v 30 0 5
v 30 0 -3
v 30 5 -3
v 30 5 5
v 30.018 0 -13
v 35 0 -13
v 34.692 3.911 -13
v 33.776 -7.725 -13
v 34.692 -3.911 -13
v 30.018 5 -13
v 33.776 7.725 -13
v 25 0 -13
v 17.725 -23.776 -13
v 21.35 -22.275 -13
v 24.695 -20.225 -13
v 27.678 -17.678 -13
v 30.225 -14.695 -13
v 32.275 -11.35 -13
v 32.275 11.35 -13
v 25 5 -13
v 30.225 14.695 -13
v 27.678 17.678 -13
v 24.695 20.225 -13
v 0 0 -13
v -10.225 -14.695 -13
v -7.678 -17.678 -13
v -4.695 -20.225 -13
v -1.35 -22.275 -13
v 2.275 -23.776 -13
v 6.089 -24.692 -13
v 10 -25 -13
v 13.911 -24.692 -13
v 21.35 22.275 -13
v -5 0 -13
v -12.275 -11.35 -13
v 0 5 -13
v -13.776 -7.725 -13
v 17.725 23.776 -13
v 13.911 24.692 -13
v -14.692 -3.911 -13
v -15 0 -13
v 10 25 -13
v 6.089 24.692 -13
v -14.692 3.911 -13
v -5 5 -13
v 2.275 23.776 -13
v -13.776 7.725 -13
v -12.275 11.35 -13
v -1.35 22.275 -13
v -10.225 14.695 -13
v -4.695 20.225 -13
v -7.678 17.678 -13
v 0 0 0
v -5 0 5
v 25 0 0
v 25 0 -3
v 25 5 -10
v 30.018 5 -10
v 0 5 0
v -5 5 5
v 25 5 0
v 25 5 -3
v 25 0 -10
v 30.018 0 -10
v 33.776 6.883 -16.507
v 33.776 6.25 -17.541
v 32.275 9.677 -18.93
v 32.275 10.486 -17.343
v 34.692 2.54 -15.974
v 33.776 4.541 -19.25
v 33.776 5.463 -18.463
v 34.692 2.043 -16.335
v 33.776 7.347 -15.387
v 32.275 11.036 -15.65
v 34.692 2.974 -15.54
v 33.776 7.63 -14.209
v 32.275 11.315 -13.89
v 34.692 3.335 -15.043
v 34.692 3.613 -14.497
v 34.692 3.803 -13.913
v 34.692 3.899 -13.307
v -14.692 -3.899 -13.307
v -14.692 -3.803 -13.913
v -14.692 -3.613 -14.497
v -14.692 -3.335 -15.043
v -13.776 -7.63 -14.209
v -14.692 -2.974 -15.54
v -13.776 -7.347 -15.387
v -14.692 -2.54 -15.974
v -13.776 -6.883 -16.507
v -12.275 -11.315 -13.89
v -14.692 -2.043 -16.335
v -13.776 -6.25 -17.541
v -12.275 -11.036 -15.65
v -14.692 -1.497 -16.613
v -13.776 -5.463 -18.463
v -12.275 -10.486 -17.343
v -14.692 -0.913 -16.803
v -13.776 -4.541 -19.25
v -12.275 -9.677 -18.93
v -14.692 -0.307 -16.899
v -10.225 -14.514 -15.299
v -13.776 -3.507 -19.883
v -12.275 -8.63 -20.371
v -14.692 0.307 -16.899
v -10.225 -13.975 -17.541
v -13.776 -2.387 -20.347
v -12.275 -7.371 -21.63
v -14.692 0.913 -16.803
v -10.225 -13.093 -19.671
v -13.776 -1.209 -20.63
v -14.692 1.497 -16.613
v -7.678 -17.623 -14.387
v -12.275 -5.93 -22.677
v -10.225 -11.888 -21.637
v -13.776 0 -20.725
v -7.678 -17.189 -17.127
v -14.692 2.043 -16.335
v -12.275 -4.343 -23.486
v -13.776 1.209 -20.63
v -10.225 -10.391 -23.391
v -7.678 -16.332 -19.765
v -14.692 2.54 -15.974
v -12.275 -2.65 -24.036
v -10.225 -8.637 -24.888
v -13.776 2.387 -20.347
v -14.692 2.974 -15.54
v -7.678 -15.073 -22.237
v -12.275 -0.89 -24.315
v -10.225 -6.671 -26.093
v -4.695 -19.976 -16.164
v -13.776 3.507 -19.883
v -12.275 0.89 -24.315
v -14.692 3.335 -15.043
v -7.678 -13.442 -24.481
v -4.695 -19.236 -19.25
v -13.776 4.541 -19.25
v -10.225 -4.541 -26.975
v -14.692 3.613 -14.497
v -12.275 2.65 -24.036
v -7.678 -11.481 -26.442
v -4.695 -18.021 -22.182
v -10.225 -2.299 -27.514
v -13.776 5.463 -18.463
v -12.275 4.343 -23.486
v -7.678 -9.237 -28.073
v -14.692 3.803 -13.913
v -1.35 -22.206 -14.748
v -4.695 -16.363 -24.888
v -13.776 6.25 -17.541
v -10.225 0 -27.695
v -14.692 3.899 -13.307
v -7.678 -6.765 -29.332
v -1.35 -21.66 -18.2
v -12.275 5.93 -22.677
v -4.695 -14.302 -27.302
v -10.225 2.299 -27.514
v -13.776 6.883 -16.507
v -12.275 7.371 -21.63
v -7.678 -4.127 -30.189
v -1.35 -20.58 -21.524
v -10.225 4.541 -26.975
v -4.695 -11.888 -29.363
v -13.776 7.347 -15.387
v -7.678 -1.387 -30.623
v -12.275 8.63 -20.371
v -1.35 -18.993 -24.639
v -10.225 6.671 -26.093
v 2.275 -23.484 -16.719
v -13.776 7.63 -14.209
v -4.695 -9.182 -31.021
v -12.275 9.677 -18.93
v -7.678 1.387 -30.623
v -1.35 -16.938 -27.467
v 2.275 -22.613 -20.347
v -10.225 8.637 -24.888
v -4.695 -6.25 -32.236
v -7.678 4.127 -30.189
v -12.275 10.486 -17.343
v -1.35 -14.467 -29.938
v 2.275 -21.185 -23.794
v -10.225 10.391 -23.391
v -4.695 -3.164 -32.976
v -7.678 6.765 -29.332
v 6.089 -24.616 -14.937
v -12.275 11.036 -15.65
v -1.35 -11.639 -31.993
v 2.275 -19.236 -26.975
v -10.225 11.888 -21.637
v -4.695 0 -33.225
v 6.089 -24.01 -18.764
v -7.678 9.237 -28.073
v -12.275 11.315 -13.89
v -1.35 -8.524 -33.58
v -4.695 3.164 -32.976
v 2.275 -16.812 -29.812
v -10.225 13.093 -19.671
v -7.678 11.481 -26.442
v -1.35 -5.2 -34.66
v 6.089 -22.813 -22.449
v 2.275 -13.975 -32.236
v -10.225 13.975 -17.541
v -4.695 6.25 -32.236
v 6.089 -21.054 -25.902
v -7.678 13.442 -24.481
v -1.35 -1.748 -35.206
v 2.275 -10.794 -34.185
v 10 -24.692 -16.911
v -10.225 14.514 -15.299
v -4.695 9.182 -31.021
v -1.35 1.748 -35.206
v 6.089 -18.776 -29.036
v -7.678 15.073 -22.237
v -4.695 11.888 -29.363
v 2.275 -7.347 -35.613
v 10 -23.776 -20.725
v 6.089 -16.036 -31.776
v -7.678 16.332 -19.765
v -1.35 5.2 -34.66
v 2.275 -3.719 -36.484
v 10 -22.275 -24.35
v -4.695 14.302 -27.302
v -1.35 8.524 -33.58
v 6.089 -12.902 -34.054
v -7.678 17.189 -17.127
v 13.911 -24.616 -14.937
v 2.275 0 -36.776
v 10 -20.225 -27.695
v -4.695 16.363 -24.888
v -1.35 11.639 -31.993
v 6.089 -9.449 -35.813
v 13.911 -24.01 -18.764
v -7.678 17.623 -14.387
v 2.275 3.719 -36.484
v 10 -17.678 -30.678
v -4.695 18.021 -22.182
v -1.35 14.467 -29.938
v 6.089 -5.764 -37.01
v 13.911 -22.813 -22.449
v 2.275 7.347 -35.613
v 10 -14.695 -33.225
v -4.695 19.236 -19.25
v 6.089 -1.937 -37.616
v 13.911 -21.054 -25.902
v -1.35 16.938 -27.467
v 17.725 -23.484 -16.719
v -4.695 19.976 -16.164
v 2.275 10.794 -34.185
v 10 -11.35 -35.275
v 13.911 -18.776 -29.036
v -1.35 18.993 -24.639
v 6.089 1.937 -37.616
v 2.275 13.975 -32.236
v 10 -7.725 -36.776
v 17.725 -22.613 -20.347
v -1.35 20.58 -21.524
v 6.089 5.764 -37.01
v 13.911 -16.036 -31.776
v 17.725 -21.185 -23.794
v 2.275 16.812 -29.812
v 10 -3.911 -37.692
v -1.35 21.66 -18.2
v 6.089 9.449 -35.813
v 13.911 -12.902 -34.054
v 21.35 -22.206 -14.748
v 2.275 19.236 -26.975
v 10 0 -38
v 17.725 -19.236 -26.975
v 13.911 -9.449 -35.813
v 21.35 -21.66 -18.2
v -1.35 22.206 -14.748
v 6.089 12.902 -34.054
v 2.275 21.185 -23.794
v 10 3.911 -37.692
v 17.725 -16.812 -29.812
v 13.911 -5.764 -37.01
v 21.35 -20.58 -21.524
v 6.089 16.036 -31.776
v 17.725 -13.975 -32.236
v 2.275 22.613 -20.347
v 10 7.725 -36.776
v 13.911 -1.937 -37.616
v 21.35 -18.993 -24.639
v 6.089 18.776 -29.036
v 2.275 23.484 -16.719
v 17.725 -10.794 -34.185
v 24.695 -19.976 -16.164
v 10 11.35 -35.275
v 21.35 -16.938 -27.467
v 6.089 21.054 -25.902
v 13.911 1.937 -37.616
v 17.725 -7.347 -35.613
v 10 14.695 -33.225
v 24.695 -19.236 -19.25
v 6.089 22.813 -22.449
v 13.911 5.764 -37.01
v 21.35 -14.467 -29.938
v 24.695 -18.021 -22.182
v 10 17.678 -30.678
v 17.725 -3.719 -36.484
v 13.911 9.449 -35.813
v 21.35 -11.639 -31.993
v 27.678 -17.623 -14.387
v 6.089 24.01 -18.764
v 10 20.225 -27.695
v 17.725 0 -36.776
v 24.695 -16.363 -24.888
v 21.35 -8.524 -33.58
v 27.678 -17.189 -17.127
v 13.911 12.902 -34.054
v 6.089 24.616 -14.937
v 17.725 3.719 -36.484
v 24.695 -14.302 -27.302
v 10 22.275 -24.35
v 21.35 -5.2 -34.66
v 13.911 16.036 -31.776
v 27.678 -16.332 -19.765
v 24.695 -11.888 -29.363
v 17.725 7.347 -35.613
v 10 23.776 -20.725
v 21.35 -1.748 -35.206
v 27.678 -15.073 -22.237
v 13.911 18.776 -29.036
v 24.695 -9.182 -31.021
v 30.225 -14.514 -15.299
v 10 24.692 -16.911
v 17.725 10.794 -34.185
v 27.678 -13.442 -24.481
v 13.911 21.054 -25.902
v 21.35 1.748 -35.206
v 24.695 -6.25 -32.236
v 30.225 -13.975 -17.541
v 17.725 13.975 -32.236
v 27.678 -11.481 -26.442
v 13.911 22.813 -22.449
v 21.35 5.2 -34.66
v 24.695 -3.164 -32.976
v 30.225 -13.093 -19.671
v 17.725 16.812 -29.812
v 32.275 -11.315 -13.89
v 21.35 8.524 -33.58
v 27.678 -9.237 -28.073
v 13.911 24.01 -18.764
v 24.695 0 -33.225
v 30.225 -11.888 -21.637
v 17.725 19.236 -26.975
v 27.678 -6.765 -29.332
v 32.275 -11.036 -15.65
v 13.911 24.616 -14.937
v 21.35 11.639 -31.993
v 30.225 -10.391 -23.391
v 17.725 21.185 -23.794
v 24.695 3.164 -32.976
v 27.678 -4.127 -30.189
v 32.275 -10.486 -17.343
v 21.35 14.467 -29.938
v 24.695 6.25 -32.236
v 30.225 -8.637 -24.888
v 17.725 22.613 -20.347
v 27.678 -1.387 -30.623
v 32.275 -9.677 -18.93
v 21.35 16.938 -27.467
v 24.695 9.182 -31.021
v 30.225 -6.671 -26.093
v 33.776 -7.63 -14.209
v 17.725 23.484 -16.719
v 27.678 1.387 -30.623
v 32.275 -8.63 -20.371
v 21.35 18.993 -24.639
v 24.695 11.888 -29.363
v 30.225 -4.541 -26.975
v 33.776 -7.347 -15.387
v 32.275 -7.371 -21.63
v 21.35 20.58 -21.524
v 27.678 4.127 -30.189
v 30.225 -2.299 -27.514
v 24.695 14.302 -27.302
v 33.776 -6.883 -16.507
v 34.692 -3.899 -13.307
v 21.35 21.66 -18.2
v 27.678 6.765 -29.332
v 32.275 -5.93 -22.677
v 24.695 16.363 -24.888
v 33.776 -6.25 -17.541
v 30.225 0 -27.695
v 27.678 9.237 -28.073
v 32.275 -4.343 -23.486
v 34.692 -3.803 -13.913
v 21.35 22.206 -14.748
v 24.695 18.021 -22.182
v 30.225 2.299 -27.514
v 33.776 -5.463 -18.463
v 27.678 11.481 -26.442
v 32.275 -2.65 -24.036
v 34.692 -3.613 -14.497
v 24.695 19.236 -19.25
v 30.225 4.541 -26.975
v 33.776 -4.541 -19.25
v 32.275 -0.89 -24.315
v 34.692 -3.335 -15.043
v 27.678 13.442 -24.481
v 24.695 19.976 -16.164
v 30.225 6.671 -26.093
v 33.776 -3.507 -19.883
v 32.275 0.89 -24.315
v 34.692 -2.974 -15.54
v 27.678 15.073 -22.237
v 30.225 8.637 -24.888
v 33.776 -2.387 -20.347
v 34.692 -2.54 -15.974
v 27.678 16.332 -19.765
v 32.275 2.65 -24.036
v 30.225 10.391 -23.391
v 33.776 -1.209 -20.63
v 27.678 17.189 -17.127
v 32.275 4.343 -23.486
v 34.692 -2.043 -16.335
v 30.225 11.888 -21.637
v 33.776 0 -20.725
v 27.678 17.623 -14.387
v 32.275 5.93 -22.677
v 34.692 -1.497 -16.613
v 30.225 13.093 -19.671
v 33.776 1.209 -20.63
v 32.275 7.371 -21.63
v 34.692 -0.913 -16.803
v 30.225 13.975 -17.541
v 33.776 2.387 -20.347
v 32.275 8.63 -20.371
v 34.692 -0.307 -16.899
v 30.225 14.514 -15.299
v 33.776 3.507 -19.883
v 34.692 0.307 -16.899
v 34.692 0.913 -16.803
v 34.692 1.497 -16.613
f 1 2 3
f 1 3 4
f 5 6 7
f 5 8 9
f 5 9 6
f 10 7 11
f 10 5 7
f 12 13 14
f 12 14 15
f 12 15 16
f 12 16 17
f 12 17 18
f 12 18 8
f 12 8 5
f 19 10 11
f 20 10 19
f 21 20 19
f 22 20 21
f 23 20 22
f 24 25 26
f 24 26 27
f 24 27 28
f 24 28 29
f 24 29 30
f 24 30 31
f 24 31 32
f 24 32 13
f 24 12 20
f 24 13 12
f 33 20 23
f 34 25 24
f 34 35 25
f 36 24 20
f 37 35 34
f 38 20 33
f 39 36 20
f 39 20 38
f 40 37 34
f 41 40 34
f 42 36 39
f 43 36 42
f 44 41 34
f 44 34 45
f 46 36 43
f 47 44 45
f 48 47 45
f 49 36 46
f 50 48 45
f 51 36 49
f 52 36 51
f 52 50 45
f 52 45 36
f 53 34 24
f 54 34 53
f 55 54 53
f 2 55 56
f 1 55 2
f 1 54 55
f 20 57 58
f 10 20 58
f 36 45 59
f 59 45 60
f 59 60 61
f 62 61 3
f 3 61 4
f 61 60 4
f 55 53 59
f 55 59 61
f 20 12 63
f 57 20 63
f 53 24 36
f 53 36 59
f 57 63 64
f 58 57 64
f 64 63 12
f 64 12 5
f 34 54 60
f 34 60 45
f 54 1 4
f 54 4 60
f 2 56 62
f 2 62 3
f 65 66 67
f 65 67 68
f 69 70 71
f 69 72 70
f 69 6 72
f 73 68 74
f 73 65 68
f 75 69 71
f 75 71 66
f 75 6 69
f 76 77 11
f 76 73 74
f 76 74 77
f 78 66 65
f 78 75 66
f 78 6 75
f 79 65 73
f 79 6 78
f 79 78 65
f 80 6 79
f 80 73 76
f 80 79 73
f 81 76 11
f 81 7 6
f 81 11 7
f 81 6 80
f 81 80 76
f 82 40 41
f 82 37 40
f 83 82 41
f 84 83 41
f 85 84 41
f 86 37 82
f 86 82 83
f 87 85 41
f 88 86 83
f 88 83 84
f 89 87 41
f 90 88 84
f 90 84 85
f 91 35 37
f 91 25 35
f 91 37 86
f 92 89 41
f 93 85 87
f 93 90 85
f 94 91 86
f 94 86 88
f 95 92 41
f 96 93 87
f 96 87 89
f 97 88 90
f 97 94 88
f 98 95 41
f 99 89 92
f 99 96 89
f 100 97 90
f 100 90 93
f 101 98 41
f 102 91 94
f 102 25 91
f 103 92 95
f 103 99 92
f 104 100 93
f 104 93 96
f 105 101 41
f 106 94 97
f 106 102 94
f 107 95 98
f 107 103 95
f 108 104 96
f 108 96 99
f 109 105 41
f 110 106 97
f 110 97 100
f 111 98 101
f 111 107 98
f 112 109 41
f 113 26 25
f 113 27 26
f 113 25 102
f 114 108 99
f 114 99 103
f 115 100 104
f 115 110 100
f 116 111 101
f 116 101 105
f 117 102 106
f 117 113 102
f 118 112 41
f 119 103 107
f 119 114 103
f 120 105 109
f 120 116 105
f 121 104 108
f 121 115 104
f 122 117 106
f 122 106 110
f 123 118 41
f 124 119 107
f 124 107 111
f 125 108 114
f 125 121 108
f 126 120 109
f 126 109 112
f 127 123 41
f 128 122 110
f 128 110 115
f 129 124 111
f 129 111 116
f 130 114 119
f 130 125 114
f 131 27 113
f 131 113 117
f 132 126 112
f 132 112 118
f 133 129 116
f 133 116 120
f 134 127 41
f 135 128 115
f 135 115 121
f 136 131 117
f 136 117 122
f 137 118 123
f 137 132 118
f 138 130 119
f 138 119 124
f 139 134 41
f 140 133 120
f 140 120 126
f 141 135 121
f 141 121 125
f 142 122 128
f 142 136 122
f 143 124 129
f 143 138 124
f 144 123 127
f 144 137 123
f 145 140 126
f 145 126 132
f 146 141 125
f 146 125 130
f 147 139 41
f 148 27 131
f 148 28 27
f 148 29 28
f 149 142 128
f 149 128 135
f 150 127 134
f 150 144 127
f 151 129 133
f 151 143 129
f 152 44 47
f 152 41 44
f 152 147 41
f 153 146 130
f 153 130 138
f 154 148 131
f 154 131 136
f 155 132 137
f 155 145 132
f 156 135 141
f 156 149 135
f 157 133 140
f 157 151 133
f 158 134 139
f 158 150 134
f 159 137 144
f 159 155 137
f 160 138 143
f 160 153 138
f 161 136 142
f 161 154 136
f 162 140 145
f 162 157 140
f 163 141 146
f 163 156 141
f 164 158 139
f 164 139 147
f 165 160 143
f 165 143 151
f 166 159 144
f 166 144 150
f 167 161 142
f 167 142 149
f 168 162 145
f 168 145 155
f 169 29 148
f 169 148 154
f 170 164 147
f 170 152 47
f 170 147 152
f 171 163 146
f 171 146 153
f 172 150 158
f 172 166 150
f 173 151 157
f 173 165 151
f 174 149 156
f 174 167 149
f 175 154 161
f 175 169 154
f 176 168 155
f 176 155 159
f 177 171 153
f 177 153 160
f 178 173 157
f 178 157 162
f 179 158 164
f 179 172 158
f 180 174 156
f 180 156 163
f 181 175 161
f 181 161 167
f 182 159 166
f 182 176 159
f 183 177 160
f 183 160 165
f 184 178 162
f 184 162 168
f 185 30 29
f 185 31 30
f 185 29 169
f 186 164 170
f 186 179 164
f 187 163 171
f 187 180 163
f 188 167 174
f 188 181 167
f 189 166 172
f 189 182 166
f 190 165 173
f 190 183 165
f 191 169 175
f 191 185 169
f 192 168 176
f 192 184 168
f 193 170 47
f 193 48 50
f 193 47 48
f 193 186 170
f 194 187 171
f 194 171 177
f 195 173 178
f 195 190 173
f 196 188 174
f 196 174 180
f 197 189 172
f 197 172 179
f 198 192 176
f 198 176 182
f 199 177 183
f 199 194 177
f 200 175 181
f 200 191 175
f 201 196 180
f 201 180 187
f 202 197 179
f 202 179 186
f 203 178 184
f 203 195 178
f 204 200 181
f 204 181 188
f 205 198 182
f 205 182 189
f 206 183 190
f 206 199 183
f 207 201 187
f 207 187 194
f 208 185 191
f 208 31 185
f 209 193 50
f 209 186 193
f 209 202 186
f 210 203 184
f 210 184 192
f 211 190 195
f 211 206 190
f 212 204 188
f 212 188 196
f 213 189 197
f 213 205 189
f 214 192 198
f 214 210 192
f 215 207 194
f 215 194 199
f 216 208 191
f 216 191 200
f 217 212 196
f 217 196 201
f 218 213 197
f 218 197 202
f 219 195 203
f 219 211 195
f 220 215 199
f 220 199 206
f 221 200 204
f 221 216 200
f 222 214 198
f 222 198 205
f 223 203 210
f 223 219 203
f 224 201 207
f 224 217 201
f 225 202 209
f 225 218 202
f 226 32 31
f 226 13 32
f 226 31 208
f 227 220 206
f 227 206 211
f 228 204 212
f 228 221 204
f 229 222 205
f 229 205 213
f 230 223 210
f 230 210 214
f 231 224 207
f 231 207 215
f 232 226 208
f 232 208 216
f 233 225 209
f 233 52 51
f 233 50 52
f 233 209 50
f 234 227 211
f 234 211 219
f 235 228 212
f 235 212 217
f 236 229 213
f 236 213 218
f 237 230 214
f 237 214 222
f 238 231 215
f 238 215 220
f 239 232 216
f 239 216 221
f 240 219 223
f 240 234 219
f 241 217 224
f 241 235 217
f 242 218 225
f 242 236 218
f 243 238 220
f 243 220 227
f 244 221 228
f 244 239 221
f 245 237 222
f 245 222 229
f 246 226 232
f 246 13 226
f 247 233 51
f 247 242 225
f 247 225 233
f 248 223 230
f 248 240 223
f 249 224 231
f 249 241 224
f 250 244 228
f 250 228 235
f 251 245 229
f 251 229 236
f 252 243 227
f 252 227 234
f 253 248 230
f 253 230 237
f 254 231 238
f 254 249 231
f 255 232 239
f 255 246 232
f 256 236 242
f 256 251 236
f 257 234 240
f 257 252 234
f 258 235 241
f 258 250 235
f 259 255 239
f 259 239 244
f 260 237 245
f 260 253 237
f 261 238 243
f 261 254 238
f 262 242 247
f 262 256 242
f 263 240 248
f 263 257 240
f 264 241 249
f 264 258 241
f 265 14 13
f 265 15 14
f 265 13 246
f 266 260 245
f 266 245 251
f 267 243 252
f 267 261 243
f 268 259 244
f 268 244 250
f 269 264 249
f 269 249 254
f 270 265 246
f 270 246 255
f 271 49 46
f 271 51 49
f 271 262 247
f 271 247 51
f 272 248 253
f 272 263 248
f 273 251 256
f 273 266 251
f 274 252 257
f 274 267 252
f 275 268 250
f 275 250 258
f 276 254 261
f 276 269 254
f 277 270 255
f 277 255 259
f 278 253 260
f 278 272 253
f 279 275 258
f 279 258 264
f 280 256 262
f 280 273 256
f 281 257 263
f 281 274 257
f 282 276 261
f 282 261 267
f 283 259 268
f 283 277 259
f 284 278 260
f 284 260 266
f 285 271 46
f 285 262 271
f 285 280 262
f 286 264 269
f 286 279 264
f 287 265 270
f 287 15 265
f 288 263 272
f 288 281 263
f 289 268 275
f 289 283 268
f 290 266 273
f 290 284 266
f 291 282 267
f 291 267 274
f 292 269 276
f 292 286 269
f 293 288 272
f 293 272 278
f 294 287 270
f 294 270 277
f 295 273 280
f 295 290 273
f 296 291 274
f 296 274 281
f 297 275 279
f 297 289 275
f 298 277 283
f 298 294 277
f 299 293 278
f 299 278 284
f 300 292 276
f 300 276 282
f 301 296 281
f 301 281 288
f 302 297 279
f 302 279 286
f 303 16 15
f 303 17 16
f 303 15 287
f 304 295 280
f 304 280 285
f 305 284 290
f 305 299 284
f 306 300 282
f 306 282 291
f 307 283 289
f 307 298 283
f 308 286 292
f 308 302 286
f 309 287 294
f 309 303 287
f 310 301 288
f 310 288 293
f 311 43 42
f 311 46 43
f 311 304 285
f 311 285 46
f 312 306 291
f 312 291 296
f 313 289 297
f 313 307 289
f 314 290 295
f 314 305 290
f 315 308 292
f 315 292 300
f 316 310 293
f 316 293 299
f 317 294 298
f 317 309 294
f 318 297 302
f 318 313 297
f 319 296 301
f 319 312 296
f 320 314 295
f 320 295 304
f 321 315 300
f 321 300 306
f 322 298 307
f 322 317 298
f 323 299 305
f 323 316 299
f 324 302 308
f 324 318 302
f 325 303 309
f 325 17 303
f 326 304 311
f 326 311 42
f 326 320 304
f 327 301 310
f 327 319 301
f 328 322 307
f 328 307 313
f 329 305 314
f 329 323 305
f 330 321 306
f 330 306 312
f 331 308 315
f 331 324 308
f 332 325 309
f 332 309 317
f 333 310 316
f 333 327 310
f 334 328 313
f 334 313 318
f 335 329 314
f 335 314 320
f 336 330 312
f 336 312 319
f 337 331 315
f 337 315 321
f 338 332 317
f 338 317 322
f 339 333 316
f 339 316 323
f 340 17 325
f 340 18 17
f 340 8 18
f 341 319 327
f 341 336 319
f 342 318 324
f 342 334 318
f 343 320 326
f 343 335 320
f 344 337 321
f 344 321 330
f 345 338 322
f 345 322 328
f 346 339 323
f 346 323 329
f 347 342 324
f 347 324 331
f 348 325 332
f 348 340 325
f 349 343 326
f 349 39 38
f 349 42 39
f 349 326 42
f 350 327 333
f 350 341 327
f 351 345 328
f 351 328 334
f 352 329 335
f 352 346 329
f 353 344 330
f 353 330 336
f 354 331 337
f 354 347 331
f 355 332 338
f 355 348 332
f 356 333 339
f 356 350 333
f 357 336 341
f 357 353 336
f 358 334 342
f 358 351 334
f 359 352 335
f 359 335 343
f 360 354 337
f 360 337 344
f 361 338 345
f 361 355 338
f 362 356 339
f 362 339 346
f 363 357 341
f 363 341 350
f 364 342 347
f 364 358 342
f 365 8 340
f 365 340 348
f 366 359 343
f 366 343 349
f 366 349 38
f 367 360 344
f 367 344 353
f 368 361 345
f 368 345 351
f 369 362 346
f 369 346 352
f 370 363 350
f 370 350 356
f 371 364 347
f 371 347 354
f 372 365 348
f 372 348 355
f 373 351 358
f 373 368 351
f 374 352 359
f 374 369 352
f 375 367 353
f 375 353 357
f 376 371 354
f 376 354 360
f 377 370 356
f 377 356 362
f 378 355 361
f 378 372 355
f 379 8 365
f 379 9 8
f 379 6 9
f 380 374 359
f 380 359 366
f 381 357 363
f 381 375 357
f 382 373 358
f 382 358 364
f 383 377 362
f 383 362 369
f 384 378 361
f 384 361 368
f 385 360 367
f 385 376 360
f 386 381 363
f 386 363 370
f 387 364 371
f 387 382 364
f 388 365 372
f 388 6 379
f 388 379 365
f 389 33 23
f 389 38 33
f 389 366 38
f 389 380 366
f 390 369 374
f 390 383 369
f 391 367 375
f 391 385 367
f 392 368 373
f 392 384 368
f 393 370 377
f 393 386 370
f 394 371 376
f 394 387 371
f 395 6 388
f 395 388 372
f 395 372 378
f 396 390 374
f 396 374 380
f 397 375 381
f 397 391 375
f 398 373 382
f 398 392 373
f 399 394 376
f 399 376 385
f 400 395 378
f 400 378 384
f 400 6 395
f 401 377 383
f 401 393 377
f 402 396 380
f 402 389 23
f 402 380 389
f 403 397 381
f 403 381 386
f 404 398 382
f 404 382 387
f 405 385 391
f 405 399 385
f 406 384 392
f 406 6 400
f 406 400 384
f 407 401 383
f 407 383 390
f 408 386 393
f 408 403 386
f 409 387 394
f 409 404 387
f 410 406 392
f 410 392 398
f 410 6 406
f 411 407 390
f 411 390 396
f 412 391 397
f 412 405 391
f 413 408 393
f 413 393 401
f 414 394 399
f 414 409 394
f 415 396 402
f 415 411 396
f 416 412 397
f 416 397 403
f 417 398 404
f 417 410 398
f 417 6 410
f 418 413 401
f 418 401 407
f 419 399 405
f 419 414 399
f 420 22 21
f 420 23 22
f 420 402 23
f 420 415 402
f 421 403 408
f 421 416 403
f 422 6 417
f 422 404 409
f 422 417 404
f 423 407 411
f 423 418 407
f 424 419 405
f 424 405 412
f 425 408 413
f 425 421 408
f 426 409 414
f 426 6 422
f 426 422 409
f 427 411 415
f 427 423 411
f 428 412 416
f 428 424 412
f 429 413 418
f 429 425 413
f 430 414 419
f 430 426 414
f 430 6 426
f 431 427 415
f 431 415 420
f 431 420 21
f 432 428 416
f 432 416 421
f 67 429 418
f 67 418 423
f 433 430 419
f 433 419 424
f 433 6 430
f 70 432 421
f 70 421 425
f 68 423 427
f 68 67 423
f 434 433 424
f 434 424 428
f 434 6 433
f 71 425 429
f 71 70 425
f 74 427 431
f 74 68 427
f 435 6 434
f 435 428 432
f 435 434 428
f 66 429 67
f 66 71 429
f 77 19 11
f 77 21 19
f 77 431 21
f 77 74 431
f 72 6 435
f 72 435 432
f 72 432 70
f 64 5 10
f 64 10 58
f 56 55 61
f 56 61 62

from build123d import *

# Parameters (mm, degrees)
SKETCH001_W            = 5.018169
SKETCH001_H            = 3
EXTRUDE001_DEPTH       = 5
BOX_W                  = 210
BOX_H                  = 320
BOX_DEPTH              = 320
CUT001_PLACEMENT_ANGLE = 90
EXTRUDE_DEPTH          = 5


with BuildPart() as extrude001:
    # Sketch001 → Extrude001 (new body)
    with BuildSketch(Plane.XZ):
        with Locations((27.509085, -11.5)):
            Rectangle(SKETCH001_W, SKETCH001_H)
    extrude(amount=-EXTRUDE001_DEPTH)


with BuildPart() as cubo:
    # Box → Box (new body)
    with BuildSketch(Plane(origin=(0, -151, -150), x_dir=(1, 0, 0), z_dir=(0, 0, 1))):
        with Locations((105, 160)):
            Rectangle(BOX_W, BOX_H)
    extrude(amount=BOX_DEPTH)


with BuildPart() as cut:
    # Sphere → Sphere (revolve)
    with BuildSketch(Plane.XZ):
        with BuildLine():
            ThreePointArc((0, -150), (150, 0), (0, 150))
            Line((0, 150), (0, -150))
        make_face()
    revolve(axis=Axis((0, 0, 0), (0, 0, 1)))

    # Cut: cut Cubo
    add(cubo.part, mode=Mode.SUBTRACT)


with BuildPart() as cut001:
    # Sphere001 → Sphere001 (revolve)
    with BuildSketch(Plane.XZ):
        with BuildLine():
            ThreePointArc((0, -25), (25, 0), (0, 25))
            Line((0, 25), (0, -25))
        make_face()
    revolve(axis=Axis((0, 0, 0), (0, 0, 1)))

    # Cut001: cut Cut
    add(cut.part, mode=Mode.SUBTRACT)


with BuildPart() as cut001_1:
    # Cut001 placement: moved
    add(cut001.part.moved(Location((10, 0, -13))).rotate(Axis((10, 0, -13), (0, 1, 0)), CUT001_PLACEMENT_ANGLE))


with BuildPart() as fusion001:
    # Sketch → Extrude (new body)
    with BuildSketch(Plane.XZ):
        Polygon((0, 0), (25, 0), (25, -3), (30, -3), (30, 5), (-5, 5), (-5, -13), (0, -13), align=None)
    extrude(amount=-EXTRUDE_DEPTH)

    # Fusion: union Cut001
    add(cut001_1.part)

    # Fusion001: union Extrude001
    add(extrude001.part)


solid = fusion001.part
